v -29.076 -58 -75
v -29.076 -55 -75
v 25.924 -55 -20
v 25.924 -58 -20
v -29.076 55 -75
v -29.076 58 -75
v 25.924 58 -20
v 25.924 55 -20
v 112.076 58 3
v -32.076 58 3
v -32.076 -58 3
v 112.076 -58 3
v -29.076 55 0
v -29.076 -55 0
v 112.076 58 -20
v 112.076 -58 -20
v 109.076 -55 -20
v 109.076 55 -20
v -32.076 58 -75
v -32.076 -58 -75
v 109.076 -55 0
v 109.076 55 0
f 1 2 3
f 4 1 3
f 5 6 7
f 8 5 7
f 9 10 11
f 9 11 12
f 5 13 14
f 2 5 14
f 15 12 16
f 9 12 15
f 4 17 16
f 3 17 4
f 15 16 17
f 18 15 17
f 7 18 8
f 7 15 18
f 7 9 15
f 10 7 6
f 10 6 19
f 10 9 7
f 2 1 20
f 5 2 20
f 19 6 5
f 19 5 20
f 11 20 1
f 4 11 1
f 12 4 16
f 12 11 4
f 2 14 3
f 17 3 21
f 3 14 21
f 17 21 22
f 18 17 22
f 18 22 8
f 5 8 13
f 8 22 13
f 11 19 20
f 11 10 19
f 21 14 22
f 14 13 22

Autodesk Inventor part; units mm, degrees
ref_plane "YZ Plane" through (0, 0, 0) normal (1, 0, 0) x (0, 1, 0)
ref_plane "XZ Plane" through (0, 0, 0) normal (0, 1, 0) x (-1, 0, 0)
ref_plane "XY Plane" through (0, 0, 0) normal (0, 0, 1) x (1, 0, 0)
sketch "Эскиз1" plane through (0, 0, 0) normal (0, 0, 1) x (1, 0, 0)
  line L0 (29.9444, -74.6554) -> (-27.0756, -74.6554) projected
  line L1 (29.9444, 31.7946) -> (29.9444, -74.6554) projected
  line L2 (-27.0756, 31.7946) -> (29.9444, 31.7946) projected
  line L3 (-27.0756, -74.6554) -> (-27.0756, 31.7946) projected
  circle A0 centre (-22.2656, 27.6646) radius 2 projected
  circle A1 centre (-22.2656, -70.5254) radius 2 projected
  circle A2 centre (25.1344, -70.5254) radius 2 projected
  circle A3 centre (25.1344, 27.6646) radius 2 projected
  line L4 (-29.0756, 55) -> (29.0756, 55)
  line L5 (29.0756, 55) -> (29.0756, -55)
  line L6 (29.0756, -55) -> (-29.0756, -55)
  line L7 (-29.0756, -55) -> (-29.0756, 55)
  line L8 (-29.0756, 55) -> (29.0756, -55) construction
  line L9 (29.0756, 55) -> (-29.0756, -55) construction
  line L10 (-32.0756, 58) -> (32.0756, 58)
  line L11 (32.0756, 58) -> (32.0756, -58)
  line L12 (32.0756, -58) -> (-32.0756, -58)
  line L13 (-32.0756, -58) -> (-32.0756, 58)
  line L14 (29.0756, 55) -> (109.0756, 55)
  line L15 (109.0756, 55) -> (109.0756, -55)
  line L16 (109.0756, -55) -> (29.0756, -55)
  line L17 (32.0756, -58) -> (112.0756, -58)
  line L18 (112.0756, -58) -> (112.0756, 58)
  line L19 (112.0756, 58) -> (32.0756, 58)
  point P0 (0, 0)
  dimension "d0" = 110
  dimension "d1" = 2
  dimension "d2" = 3
  dimension "d3" = 80
  dimension "d4" = 80
extrude "Выдавливание1" add sketch "Эскиз1" along normal blind 3 contours L12 L3 L6 L16 L1 | L1 L16 L11 L12 | L12 L13 L10 L11 L14 L4 L7 L6 L3 | L16 L5 L2 L1 | L1 L2 L5 L14 L11 L16 | L11 L16 L15 L14 L19 L18 L17 | L6 L7 L4 L5 L2 L3 | L3 L2 L5 L6 | L11 L14 L15 L16 | A0 | A3
sketch "Эскиз2" plane through (0, 0, 0) normal (0, 0, -1) x (-1, 0, 0)
  line L0 (-112.0756, -58) -> (-112.0756, 58) projected
  line L1 (32.0756, -58) -> (-112.0756, -58) projected
  line L2 (32.0756, 58) -> (32.0756, -58) projected
  line L3 (-112.0756, 58) -> (32.0756, 58) projected
  line L4 (-109.0756, -55) -> (-109.0756, 55)
  line L5 (-109.0756, 55) -> (29.0756, 55)
  line L6 (29.0756, 55) -> (29.0756, -55)
  line L7 (29.0756, -55) -> (-109.0756, -55)
  point P0 (0, 0)
  dimension "d7" = 3
extrude "Выдавливание2" add sketch "Эскиз2" along normal blind 75
sketch "Эскиз3" plane through (-32.0756, 58, 3) normal (0, 1, 0) x (1, 0, 0)
  line L0 (3, 3) -> (3, 78) projected
  line L1 (3, 78) -> (78, 3)
  line L2 (3, 3) -> (141.1512, 3) projected
  line L3 (0, 78) -> (0, 0) projected
  line L4 (144.1512, 0) -> (0, 0) projected
  line L5 (144.1512, 78) -> (144.1512, 0) projected
  line L6 (0, 78) -> (144.1512, 78) projected
  line L7 (141.1512, 3) -> (141.1512, 78) projected
  line L8 (141.1512, 3) -> (144.1512, 3)
  line L9 (144.1512, 78) -> (144.1512, 0) projected
  line L10 (144.1512, 3) -> (144.1512, 18)
  line L11 (144.1512, 0) -> (144.1512, 78) projected
  line L12 (144.1512, 18) -> (63, 18)
  line L13 (135.5856, 23) -> (56.5656, 23) projected
  line L14 (58, 23) -> (144.1512, 23)
  point P0 (32.0756, 3)
  point P1 (78, 3)
  point P2 (3, 78)
  point P3 (144.1512, 3)
  point P4 (144.1512, 18)
  point P5 (58, 23)
  point P6 (134.1512, 23)
  dimension "d10" = 45
  dimension "d13" = 15
extrude "Выдавливание3" cut sketch "Эскиз3" against normal up to surface (116 mm away) contours L6 L7 L14 L13 L1 | L6 L5 L14 L7
sketch "Эскиз4" plane through (-32.0756, -58, 3) normal (-1, 0, 0) x (0, 0, 1)
  line L0 (-78, 116) -> (-78, 113) projected
  line L1 (-78, 116) -> (-72, 116)
  line L2 (-23, 116) -> (-78, 116) projected
  line L3 (-72, 116) -> (-72, 0)
  line L4 (-78, 0) -> (0, 0) projected
  point P0 (-3, 58)
  point P1 (-18, 116)
  point P2 (-3, 116)
  dimension "d14" = 6
sketch "Эскиз5" plane through (112.0756, -58, 3) normal (1, 0, 0) x (0, 0, -1)
  line L0 (78, 116) -> (0, 116) projected
  line L1 (23, 116) -> (0, 116)
  line L2 (11.5, 116) -> (11.5, 0)
  line L3 (78, 0) -> (0, 0) projected
  point P0 (3, 58)
properties part number "LPS_base"
